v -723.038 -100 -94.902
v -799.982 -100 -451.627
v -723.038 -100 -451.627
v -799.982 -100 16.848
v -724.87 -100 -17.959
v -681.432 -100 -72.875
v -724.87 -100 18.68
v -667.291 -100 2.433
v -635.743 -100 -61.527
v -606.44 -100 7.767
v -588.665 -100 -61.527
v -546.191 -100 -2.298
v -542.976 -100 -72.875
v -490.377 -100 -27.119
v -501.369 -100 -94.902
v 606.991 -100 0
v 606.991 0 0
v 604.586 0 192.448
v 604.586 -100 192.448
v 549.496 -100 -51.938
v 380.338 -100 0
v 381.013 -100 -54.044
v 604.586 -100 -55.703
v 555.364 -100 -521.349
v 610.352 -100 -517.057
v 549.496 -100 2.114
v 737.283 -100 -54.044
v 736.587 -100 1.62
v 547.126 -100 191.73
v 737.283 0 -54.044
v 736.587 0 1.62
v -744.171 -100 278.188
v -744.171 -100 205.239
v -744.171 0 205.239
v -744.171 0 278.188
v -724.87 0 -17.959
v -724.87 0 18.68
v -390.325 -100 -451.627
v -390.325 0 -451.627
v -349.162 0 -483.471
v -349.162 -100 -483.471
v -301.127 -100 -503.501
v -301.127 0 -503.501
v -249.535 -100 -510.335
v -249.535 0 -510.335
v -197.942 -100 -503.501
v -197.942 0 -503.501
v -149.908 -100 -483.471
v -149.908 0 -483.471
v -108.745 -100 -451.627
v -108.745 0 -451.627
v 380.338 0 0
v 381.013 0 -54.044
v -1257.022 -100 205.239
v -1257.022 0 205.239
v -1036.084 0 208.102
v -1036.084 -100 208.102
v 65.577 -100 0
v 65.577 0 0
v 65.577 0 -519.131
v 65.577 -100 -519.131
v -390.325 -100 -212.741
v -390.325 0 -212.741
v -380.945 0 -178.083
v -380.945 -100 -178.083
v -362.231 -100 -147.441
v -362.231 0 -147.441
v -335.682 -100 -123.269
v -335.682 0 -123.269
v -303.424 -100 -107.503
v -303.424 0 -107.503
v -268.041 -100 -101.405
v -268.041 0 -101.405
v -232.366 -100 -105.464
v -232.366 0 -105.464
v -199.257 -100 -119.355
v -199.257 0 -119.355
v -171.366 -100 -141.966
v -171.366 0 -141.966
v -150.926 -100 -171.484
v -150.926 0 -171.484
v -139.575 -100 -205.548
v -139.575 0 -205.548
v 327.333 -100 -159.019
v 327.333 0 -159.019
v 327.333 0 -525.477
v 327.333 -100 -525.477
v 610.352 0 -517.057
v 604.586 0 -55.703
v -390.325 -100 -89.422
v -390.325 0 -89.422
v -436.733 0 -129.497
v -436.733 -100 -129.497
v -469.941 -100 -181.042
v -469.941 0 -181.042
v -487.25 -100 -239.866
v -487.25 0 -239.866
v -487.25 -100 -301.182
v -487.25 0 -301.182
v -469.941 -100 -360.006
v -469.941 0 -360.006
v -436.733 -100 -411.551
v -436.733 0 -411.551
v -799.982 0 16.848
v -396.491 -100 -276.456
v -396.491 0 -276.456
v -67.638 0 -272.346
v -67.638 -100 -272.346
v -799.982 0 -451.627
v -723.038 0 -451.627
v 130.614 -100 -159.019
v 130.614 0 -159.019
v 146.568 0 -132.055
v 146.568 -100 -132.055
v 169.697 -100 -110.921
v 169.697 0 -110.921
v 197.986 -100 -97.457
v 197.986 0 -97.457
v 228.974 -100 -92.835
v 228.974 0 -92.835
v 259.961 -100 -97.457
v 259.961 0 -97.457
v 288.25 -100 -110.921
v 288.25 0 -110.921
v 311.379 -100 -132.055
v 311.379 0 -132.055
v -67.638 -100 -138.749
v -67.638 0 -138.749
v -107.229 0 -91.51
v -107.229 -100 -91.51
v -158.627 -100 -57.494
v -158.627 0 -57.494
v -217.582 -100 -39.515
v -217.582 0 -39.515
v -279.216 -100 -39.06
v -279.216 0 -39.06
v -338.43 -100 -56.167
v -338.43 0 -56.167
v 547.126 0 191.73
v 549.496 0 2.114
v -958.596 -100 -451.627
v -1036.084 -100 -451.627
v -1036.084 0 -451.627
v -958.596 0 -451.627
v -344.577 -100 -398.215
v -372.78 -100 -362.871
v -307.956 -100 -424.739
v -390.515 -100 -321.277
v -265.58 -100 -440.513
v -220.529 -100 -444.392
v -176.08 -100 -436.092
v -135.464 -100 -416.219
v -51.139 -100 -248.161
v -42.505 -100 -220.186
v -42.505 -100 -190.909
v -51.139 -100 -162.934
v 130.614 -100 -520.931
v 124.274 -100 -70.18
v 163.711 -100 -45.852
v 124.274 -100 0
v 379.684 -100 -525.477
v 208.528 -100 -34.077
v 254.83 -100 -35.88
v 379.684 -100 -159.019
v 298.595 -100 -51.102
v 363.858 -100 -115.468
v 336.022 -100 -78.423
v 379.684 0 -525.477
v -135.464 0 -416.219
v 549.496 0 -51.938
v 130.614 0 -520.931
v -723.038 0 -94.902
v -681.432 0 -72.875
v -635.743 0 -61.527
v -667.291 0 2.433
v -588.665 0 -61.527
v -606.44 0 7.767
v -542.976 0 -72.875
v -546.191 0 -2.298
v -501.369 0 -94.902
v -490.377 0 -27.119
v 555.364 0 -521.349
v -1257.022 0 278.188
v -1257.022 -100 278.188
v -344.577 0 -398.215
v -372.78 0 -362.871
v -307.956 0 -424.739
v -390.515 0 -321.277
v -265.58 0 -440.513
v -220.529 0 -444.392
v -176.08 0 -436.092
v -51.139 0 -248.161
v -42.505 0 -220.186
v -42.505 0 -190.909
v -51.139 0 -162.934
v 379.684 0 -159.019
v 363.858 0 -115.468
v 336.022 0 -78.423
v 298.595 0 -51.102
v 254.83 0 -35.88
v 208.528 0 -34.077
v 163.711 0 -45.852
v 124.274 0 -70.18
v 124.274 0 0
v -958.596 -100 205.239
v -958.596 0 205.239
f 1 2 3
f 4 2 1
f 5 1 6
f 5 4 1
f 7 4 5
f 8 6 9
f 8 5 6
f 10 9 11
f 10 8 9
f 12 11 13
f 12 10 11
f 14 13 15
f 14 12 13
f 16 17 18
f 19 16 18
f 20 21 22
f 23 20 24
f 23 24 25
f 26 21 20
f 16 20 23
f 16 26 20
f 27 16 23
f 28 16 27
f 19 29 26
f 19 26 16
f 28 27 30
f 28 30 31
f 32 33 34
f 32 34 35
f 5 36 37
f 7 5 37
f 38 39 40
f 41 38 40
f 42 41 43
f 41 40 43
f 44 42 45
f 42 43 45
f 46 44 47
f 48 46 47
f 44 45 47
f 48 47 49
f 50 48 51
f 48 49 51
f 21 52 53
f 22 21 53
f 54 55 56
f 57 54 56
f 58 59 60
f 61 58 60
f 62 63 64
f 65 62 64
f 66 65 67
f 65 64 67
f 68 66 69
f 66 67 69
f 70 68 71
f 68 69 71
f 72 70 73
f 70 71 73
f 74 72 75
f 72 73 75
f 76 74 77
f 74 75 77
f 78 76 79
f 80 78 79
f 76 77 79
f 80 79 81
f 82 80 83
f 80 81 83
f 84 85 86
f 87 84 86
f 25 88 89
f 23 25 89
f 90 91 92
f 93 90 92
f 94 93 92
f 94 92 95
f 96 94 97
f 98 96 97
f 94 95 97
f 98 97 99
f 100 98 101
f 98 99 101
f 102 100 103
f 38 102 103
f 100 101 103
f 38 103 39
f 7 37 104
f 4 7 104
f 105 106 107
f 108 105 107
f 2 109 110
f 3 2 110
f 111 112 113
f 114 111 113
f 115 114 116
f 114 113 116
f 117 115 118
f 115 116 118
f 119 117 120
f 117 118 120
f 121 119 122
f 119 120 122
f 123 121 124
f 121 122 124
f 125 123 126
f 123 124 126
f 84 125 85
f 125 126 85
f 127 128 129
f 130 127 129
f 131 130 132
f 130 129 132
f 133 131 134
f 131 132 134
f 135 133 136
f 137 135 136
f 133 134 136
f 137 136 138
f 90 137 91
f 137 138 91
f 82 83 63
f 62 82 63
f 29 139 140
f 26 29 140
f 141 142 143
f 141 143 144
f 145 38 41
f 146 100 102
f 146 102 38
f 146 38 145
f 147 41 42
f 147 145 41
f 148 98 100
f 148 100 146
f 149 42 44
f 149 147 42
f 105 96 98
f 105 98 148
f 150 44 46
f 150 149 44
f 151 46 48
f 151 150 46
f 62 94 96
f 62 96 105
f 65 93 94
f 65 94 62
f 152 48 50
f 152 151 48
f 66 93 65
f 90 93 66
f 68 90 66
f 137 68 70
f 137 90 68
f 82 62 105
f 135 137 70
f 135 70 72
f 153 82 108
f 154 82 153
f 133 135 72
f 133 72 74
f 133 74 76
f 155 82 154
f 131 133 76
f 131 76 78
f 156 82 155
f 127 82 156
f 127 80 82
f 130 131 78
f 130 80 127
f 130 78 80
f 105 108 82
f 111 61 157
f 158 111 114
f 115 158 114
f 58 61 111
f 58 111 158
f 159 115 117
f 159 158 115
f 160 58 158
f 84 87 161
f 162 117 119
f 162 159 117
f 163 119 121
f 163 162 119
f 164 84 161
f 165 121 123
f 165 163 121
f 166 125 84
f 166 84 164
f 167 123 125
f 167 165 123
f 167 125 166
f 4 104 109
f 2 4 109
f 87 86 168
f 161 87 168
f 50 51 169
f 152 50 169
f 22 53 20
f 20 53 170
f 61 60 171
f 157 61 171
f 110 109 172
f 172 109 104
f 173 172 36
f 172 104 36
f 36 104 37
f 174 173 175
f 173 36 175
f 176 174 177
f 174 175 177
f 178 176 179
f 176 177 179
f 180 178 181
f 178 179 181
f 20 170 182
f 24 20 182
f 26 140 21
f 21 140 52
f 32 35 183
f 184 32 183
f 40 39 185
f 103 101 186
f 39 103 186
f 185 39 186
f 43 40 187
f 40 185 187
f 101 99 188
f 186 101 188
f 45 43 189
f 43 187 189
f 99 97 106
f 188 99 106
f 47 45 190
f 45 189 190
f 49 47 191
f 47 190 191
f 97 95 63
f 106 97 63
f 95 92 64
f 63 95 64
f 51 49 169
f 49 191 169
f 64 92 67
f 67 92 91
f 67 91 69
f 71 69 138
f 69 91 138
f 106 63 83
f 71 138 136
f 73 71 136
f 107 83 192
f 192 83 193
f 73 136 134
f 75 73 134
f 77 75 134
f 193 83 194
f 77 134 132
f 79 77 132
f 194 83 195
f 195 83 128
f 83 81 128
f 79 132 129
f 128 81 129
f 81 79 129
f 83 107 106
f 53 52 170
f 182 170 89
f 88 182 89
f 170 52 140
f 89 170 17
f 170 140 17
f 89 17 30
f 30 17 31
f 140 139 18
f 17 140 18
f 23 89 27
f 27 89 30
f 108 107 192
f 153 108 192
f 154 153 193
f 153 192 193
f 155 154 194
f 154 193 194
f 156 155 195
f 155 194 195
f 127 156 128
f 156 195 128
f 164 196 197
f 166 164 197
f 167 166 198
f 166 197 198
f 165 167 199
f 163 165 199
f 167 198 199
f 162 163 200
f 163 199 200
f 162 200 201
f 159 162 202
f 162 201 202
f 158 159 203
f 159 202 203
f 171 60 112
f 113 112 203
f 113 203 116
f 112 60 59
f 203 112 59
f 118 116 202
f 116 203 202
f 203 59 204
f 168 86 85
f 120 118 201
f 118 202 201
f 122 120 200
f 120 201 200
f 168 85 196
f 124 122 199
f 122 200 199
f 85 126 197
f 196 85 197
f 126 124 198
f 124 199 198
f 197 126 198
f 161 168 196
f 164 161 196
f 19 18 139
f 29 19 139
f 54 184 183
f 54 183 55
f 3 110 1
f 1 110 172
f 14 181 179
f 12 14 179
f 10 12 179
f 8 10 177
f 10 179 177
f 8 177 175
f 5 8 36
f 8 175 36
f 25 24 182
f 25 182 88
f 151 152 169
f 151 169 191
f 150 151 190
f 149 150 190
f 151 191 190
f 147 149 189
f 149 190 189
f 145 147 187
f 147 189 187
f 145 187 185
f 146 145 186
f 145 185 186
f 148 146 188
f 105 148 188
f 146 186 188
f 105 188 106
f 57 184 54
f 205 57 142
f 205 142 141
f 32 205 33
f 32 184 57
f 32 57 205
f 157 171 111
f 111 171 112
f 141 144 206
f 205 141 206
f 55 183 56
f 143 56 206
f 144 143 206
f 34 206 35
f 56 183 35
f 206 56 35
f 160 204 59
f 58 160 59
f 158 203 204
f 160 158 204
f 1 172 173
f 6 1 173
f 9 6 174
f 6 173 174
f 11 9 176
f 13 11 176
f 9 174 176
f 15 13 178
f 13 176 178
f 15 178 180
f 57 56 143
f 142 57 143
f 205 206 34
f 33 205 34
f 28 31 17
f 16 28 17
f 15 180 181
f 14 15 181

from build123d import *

# Parameters (mm, degrees)
F1_DEPTH = 100
F2_DEPTH = 100
F3_DEPTH = 100
F4_DEPTH = 100
F5_DEPTH = 100


with BuildPart() as f1:
    # F0 (on Front) → F1 (new body)
    with BuildSketch(Plane.XZ):
        Polygon((-1036.084294, 208.102405), (-1036.084294, -451.626509), (-958.595753, -451.626509), (-958.595753, 205.239475), (-744.171321, 205.239475), (-744.171321, 278.18799), (-1257.021546, 278.18799), (-1257.021546, 205.239475), align=None)
    extrude(amount=F1_DEPTH)


with BuildPart() as f2:
    # F0 (on Front) → F2 (new body)
    with BuildSketch(Plane.XZ):
        with BuildLine():
            Line((-799.981534, 16.84829), (-799.981534, -451.626509))
            Line((-799.981534, -451.626509), (-723.038435, -451.626509))
            Line((-723.038435, -451.626509), (-723.038435, -94.902396))
            ThreePointArc((-723.038435, -94.902396), (-612.203747, -60.092636), (-501.369059, -94.902396))
            Line((-501.369059, -94.902396), (-490.377158, -27.119182))
            ThreePointArc((-490.377158, -27.119182), (-606.43998, 7.766619), (-724.870443, -17.959304))
            Line((-724.870443, -17.959304), (-724.870443, 18.680276))
            Line((-724.870443, 18.680276), (-799.981534, 16.84829))
        make_face()
    extrude(amount=F2_DEPTH)


with BuildPart() as f3:
    # F0 (on Front) → F3 (new body)
    with BuildSketch(Plane.XZ):
        with BuildLine():
            ThreePointArc((-390.324742, -89.421645), (-489.446747, -270.524077), (-390.324742, -451.626509))
            ThreePointArc((-390.324742, -451.626509), (-249.534879, -510.334954), (-108.745016, -451.626509))
            Line((-108.745016, -451.626509), (-135.464251, -416.218519))
            ThreePointArc((-135.464251, -416.218519), (-307.956148, -424.738771), (-396.490693, -276.456326))
            Line((-396.490693, -276.456326), (-67.638494, -272.345692))
            ThreePointArc((-67.638494, -272.345692), (-41.40752, -205.547586), (-67.638494, -138.74948))
            ThreePointArc((-67.638494, -138.74948), (-217.582235, -39.514601), (-390.324742, -89.421645))
        make_face()
        with BuildLine():
            ThreePointArc((-390.324742, -212.741211), (-268.040688, -101.404954), (-139.574878, -205.547586))
            Line((-139.574878, -205.547586), (-390.324742, -212.741211))
        make_face(mode=Mode.SUBTRACT)
    extrude(amount=F3_DEPTH)


with BuildPart() as f4:
    # F0 (on Front) → F4 (new body)
    with BuildSketch(Plane.XZ):
        with BuildLine():
            Line((65.577313, 0), (65.577313, -519.131422))
            Line((65.577313, -519.131422), (130.613767, -520.931278))
            Line((130.613767, -520.931278), (130.613767, -159.01868))
            ThreePointArc((130.613767, -159.01868), (228.973519, -92.834761), (327.333272, -159.01868))
            Line((327.333272, -159.01868), (327.333272, -525.476992))
            Line((327.333272, -525.476992), (379.684448, -525.476992))
            Line((379.684448, -525.476992), (379.684448, -159.01868))
            ThreePointArc((379.684448, -159.01868), (277.276649, -41.869555), (124.274112, -70.180312))
            Line((124.274112, -70.180312), (124.274112, 0))
            Line((124.274112, 0), (65.577313, 0))
        make_face()
    extrude(amount=F4_DEPTH)


with BuildPart() as f5:
    # F0 (on Front) → F5 (new body)
    with BuildSketch(Plane.XZ):
        Polygon((549.496159, -51.937837), (555.363774, -521.349132), (610.35245, -517.057402), (604.58554, -55.702572), (737.282773, -54.043864), (736.586978, 1.619941), (606.99113, 0), (604.58554, 192.448024), (547.125978, 191.729783), (549.496159, 2.114472), (380.337652, 0), (381.013197, -54.043864), align=None)
    extrude(amount=F5_DEPTH)


solid = Compound([f1.part, f2.part, f3.part, f4.part, f5.part])
